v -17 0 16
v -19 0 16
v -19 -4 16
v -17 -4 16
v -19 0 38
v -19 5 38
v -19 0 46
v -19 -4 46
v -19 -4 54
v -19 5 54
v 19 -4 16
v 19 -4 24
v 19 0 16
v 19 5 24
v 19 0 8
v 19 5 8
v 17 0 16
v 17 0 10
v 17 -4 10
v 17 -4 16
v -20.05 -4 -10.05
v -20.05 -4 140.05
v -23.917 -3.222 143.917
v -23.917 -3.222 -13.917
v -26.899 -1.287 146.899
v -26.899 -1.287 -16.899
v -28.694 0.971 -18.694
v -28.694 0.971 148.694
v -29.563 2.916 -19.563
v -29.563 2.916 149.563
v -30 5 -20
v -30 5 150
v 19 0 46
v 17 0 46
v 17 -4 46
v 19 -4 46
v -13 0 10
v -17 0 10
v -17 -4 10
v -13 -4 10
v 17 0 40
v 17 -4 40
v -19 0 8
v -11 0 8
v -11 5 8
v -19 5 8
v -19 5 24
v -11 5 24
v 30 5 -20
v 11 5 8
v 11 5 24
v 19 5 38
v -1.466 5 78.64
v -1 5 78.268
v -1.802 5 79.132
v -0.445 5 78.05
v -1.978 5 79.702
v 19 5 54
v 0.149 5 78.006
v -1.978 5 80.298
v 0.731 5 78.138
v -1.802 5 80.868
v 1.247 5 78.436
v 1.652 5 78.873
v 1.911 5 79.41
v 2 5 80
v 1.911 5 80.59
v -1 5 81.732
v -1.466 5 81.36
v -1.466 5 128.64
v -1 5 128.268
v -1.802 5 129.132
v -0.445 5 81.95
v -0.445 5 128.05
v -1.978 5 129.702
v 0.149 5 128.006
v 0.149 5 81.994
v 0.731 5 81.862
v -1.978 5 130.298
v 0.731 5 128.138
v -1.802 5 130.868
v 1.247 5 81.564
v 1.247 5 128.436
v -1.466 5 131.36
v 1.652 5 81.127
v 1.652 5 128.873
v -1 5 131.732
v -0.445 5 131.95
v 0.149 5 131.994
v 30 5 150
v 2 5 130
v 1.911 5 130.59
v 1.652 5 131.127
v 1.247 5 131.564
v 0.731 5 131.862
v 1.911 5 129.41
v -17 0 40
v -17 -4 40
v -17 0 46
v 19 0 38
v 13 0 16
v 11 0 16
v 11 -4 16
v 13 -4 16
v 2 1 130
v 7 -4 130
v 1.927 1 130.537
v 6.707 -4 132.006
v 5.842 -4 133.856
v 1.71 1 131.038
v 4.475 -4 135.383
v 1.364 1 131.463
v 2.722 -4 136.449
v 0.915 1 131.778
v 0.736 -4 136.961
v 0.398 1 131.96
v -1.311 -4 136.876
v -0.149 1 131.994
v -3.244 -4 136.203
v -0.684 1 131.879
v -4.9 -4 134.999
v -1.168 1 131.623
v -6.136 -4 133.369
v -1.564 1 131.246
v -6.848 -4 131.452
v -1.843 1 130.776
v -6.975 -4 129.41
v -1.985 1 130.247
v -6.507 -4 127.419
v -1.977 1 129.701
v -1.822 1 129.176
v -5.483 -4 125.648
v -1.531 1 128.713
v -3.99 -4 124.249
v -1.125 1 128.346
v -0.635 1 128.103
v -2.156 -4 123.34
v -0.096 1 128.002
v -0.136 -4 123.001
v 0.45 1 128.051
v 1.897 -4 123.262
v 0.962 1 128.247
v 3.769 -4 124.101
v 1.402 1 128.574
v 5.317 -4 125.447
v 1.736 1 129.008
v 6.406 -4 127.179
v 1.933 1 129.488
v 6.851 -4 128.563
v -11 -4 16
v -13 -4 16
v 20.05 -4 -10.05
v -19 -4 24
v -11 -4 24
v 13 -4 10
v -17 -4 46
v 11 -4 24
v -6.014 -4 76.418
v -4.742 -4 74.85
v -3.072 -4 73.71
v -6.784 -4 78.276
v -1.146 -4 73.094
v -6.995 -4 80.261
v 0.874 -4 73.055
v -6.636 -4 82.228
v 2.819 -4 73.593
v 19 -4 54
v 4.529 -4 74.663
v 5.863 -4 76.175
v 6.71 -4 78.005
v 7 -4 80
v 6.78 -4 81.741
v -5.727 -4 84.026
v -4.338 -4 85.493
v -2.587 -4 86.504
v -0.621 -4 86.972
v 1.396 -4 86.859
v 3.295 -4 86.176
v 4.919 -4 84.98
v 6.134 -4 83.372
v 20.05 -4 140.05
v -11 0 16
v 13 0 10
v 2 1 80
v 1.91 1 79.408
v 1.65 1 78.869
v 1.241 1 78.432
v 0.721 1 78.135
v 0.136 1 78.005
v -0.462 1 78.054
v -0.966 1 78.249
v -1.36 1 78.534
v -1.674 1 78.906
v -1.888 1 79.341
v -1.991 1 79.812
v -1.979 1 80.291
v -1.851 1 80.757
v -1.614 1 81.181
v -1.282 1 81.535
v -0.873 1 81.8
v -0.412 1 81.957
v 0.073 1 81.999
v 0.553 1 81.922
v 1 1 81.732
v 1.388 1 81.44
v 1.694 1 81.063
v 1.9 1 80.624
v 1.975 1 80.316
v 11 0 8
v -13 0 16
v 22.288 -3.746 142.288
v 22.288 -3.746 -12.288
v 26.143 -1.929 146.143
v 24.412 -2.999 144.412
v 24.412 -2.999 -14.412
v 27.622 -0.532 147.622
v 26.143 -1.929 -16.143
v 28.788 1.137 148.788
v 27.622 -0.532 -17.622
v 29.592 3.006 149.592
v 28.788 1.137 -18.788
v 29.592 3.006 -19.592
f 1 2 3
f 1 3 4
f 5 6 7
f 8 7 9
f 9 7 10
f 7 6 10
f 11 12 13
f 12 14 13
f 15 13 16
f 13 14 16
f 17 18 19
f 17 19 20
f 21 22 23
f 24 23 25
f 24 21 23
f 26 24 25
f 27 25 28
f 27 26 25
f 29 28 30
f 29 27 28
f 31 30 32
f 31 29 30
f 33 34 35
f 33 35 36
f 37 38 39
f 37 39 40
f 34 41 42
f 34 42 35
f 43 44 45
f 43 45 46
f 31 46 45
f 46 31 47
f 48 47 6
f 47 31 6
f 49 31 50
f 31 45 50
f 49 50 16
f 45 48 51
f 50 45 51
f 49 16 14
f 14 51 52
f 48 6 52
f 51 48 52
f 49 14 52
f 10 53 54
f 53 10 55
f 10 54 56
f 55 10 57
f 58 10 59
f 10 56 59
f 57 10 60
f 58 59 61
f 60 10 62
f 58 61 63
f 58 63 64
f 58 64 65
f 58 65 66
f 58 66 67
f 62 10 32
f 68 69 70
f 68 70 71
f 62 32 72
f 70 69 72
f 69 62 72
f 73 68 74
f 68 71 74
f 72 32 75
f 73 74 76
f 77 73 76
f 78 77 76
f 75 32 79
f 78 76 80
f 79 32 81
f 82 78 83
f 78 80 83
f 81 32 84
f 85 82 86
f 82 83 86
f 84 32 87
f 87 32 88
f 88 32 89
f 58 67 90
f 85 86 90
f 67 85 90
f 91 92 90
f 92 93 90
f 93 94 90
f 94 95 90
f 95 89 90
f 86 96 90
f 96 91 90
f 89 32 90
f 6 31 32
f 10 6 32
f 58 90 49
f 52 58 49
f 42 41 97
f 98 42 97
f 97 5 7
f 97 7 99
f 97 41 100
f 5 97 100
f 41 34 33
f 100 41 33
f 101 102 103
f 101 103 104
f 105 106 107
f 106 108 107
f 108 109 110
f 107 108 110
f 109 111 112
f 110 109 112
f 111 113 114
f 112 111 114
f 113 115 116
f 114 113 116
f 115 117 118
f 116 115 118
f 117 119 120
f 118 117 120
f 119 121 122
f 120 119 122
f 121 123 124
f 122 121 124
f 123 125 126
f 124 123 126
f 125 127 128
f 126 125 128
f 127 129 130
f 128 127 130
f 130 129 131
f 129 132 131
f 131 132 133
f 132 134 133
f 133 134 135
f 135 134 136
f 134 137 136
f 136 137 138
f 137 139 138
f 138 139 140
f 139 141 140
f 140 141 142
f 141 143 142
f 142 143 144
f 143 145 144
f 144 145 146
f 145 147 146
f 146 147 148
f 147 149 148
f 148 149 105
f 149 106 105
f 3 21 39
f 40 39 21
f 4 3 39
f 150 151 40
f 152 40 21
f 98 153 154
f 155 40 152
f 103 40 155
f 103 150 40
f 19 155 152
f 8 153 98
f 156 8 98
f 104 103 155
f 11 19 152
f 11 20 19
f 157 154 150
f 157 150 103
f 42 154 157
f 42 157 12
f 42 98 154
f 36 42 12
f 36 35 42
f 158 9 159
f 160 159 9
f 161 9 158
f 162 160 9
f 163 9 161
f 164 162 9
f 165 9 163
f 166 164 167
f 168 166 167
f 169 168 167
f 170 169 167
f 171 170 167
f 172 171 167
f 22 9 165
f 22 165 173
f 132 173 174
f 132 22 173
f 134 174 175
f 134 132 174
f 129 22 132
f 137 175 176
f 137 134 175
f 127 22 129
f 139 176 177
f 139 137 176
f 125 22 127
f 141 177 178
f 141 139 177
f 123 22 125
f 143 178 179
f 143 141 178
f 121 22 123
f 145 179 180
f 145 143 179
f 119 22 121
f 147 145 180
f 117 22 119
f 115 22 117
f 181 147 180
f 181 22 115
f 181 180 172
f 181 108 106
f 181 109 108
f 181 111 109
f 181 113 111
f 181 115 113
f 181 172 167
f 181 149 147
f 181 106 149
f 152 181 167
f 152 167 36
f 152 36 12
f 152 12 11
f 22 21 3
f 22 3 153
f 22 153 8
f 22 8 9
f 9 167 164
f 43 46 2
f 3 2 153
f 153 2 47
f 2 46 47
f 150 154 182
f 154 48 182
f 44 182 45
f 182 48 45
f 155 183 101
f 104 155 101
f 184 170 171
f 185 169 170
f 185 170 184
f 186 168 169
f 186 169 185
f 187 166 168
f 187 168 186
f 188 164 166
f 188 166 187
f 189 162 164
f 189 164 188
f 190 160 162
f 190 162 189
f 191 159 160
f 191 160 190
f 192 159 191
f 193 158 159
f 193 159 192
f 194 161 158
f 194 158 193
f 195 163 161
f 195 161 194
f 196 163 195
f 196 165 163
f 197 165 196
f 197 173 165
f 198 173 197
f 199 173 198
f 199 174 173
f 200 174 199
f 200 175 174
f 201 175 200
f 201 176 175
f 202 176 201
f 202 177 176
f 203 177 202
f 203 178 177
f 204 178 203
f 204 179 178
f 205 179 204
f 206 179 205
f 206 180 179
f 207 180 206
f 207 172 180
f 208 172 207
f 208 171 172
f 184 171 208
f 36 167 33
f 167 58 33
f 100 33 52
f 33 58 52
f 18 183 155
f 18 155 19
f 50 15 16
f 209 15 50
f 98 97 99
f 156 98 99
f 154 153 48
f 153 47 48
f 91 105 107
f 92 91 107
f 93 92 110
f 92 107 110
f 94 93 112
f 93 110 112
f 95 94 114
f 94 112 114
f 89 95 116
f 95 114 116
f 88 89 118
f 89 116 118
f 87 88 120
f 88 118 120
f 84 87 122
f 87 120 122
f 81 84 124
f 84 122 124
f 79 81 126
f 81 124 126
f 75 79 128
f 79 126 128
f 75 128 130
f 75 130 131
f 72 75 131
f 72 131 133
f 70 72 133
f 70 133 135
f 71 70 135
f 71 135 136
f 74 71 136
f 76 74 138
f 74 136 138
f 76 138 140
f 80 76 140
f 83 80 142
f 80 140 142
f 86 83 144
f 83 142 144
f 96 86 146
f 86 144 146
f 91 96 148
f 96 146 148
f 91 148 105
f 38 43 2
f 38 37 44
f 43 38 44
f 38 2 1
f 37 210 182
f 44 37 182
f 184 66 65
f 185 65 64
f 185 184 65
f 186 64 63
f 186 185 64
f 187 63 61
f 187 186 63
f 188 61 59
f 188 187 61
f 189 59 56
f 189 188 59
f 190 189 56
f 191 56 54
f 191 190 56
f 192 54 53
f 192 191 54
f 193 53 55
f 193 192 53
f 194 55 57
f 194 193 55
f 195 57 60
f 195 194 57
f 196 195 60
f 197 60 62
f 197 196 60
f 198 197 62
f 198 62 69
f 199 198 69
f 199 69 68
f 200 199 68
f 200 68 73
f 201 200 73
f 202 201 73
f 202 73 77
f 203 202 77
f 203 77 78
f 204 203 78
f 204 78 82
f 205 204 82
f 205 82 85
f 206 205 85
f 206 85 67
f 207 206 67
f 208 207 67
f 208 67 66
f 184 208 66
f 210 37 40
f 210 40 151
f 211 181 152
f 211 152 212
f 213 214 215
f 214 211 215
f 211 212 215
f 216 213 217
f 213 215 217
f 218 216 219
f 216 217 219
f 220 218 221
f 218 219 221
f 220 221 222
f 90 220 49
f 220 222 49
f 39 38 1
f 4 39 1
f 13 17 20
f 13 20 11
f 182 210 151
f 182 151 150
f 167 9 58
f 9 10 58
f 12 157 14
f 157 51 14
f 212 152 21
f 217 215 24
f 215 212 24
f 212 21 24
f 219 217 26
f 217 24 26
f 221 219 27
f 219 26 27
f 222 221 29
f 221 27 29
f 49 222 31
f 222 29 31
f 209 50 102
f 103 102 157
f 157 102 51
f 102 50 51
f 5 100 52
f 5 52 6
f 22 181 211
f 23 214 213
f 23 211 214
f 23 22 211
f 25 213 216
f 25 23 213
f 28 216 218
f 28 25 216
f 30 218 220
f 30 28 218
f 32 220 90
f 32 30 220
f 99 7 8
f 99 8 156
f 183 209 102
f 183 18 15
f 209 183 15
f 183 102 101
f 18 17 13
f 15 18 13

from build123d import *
from build123d import SkipClean  # not in build123d's __all__

# Parameters (mm, degrees)
F0_R        = 2
F1_DEPTH    = 5
F0_W        = 22
F0_H        = 2
F0_W_2      = 2
F0_H_2      = 6
F0_W_3      = 4
F2_DEPTH    = 4
F3_SIZE     = 5
F4_T1_DEPTH = 219.7493718553
F4_T3_DEPTH = 109.7493718553


# Not quite as in the source:
# - a fillet or chamfer that OpenCascade refuses, or shapes differently, is made with other operations: its cross-section is extruded or revolved along the edge and cut away or added
# - a feature names something its author has since deleted; it is built from what else it names


with BuildPart() as f1:
    # F0 (on Front) → F1 (new body)
    with BuildSketch(Plane.XZ):
        with BuildLine():
            Line((-30, 150), (-30, 80))
            Line((-30, 80), (-2, 80))
            ThreePointArc((-2, 80), (0, 82), (2, 80))
            Line((2, 80), (30, 80))
            Line((30, 80), (30, 150))
            Line((30, 150), (-30, 150))
        make_face()
        with Locations((0, 130)):
            Circle(F0_R, mode=Mode.SUBTRACT)
        with BuildLine():
            Line((-30, 0), (0, 0))
            Line((0, 0), (30, 0))
            Line((30, 0), (30, 80))
            Line((30, 80), (2, 80))
            ThreePointArc((2, 80), (0, 78), (-2, 80))
            Line((-2, 80), (-30, 80))
            Line((-30, 80), (-30, 0))
        make_face()
        Polygon((-11, 24), (-11, 16), (-11, 10), (-11, 8), (-13, 8), (-17, 8), (-19, 8), (-19, 10), (-19, 16), (-19, 24), align=None, mode=Mode.SUBTRACT)
        Polygon((19, 24), (19, 16), (19, 10), (19, 8), (17, 8), (13, 8), (11, 8), (11, 10), (11, 16), (11, 24), align=None, mode=Mode.SUBTRACT)
        Polygon((-19, 54), (-11, 54), (11, 54), (19, 54), (19, 46), (19, 40), (19, 38), (17, 38), (13, 38), (11, 38), (-11, 38), (-13, 38), (-17, 38), (-19, 38), (-19, 40), (-19, 46), (-19, 48), align=None, mode=Mode.SUBTRACT)
        Polygon((30, 0), (0, 0), (-30, 0), (-30, -20), (30, -20), align=None)
    extrude(amount=-F1_DEPTH)

    # F0 (on Front) → F2 (join)
    with BuildSketch(Plane.XZ):
        with BuildLine():
            Line((-30, 0), (0, 0))
            Line((0, 0), (30, 0))
            Line((30, 0), (30, 80))
            Line((30, 80), (2, 80))
            ThreePointArc((2, 80), (0, 78), (-2, 80))
            Line((-2, 80), (-30, 80))
            Line((-30, 80), (-30, 0))
        make_face()
        Polygon((-11, 24), (-11, 16), (-11, 10), (-11, 8), (-13, 8), (-17, 8), (-19, 8), (-19, 10), (-19, 16), (-19, 24), align=None, mode=Mode.SUBTRACT)
        Polygon((19, 24), (19, 16), (19, 10), (19, 8), (17, 8), (13, 8), (11, 8), (11, 10), (11, 16), (11, 24), align=None, mode=Mode.SUBTRACT)
        Polygon((-19, 54), (-11, 54), (11, 54), (19, 54), (19, 46), (19, 40), (19, 38), (17, 38), (13, 38), (11, 38), (-11, 38), (-13, 38), (-17, 38), (-19, 38), (-19, 40), (-19, 46), (-19, 48), align=None, mode=Mode.SUBTRACT)
        with BuildLine():
            Line((-30, 150), (-30, 80))
            Line((-30, 80), (-2, 80))
            ThreePointArc((-2, 80), (0, 82), (2, 80))
            Line((2, 80), (30, 80))
            Line((30, 80), (30, 150))
            Line((30, 150), (-30, 150))
        make_face()
        with Locations((0, 130)):
            Circle(F0_R, mode=Mode.SUBTRACT)
        Polygon((30, 0), (0, 0), (-30, 0), (-30, -20), (30, -20), align=None)
        with Locations((0, 39)):
            Rectangle(F0_W, F0_H)
        with Locations((-18, 43)):
            Rectangle(F0_W_2, F0_H_2)
        with Locations((18, 43)):
            Rectangle(F0_W_2, F0_H_2)
        with Locations((-18, 13)):
            Rectangle(F0_W_2, F0_H_2)
        with Locations((-12, 13)):
            Rectangle(F0_W_2, F0_H_2)
        with Locations((12, 13)):
            Rectangle(F0_W_2, F0_H_2)
        with Locations((18, 13)):
            Rectangle(F0_W_2, F0_H_2)
        with Locations((-15, 39)):
            Rectangle(F0_W_3, F0_H)
        with Locations((15, 39)):
            Rectangle(F0_W_3, F0_H)
        with Locations((-15, 9)):
            Rectangle(F0_W_3, F0_H)
        with Locations((15, 9)):
            Rectangle(F0_W_3, F0_H)
        with Locations((-18, 39)):
            Rectangle(F0_W_2, F0_H)
        with Locations((-12, 39)):
            Rectangle(F0_W_2, F0_H)
        with Locations((12, 39)):
            Rectangle(F0_W_2, F0_H)
        with Locations((18, 39)):
            Rectangle(F0_W_2, F0_H)
        with Locations((-18, 9)):
            Rectangle(F0_W_2, F0_H)
        with Locations((-12, 9)):
            Rectangle(F0_W_2, F0_H)
        with Locations((12, 9)):
            Rectangle(F0_W_2, F0_H)
        with Locations((18, 9)):
            Rectangle(F0_W_2, F0_H)
    with SkipClean():  # cleaning this boolean's faces spoils the solid; the shape is the same uncleaned
        extrude(amount=F2_DEPTH)

    # F3
    f3_edges = [f1.edges().sort_by_distance(p)[0] for p in [
        (-2, -4, 130),
        (2, -4, 80),
    ]]
    chamfer(f3_edges, length=F3_SIZE)

    # F4: fillet of radius 10 on 4 edges, made by hand

    # F4_s2 → F4_t1 (cut)
    with BuildSketch(Plane.XY.offset(-44.8746859277)):
        with BuildLine():
            ThreePointArc((-20.0501256289, -4), (-26.7583295614, -1.4161984871), (-30, 5))
            Line((-30, 5), (-30, -4))
            Line((-30, -4), (-20.0501256289, -4))
        make_face()
        with BuildLine():
            ThreePointArc((20.0501256289, -4), (26.7583295614, -1.4161984871), (30, 5))
            Line((30, 5), (30, -4))
            Line((30, -4), (20.0501256289, -4))
        make_face()
    extrude(amount=F4_T1_DEPTH, mode=Mode.SUBTRACT)

    # F4_s4 → F4_t3 (cut)
    with BuildSketch(Plane.YZ.offset(-54.8746859277)):
        with BuildLine():
            ThreePointArc((-4, 140.0501256289), (-1.4161984871, 146.7583295614), (5, 150))
            Line((5, 150), (-4, 150))
            Line((-4, 150), (-4, 140.0501256289))
        make_face()
        with BuildLine():
            ThreePointArc((-4, -10.0501256289), (-1.4161984871, -16.7583295614), (5, -20))
            Line((5, -20), (-4, -20))
            Line((-4, -20), (-4, -10.0501256289))
        make_face()
    extrude(amount=F4_T3_DEPTH, mode=Mode.SUBTRACT)


solid = f1.part
